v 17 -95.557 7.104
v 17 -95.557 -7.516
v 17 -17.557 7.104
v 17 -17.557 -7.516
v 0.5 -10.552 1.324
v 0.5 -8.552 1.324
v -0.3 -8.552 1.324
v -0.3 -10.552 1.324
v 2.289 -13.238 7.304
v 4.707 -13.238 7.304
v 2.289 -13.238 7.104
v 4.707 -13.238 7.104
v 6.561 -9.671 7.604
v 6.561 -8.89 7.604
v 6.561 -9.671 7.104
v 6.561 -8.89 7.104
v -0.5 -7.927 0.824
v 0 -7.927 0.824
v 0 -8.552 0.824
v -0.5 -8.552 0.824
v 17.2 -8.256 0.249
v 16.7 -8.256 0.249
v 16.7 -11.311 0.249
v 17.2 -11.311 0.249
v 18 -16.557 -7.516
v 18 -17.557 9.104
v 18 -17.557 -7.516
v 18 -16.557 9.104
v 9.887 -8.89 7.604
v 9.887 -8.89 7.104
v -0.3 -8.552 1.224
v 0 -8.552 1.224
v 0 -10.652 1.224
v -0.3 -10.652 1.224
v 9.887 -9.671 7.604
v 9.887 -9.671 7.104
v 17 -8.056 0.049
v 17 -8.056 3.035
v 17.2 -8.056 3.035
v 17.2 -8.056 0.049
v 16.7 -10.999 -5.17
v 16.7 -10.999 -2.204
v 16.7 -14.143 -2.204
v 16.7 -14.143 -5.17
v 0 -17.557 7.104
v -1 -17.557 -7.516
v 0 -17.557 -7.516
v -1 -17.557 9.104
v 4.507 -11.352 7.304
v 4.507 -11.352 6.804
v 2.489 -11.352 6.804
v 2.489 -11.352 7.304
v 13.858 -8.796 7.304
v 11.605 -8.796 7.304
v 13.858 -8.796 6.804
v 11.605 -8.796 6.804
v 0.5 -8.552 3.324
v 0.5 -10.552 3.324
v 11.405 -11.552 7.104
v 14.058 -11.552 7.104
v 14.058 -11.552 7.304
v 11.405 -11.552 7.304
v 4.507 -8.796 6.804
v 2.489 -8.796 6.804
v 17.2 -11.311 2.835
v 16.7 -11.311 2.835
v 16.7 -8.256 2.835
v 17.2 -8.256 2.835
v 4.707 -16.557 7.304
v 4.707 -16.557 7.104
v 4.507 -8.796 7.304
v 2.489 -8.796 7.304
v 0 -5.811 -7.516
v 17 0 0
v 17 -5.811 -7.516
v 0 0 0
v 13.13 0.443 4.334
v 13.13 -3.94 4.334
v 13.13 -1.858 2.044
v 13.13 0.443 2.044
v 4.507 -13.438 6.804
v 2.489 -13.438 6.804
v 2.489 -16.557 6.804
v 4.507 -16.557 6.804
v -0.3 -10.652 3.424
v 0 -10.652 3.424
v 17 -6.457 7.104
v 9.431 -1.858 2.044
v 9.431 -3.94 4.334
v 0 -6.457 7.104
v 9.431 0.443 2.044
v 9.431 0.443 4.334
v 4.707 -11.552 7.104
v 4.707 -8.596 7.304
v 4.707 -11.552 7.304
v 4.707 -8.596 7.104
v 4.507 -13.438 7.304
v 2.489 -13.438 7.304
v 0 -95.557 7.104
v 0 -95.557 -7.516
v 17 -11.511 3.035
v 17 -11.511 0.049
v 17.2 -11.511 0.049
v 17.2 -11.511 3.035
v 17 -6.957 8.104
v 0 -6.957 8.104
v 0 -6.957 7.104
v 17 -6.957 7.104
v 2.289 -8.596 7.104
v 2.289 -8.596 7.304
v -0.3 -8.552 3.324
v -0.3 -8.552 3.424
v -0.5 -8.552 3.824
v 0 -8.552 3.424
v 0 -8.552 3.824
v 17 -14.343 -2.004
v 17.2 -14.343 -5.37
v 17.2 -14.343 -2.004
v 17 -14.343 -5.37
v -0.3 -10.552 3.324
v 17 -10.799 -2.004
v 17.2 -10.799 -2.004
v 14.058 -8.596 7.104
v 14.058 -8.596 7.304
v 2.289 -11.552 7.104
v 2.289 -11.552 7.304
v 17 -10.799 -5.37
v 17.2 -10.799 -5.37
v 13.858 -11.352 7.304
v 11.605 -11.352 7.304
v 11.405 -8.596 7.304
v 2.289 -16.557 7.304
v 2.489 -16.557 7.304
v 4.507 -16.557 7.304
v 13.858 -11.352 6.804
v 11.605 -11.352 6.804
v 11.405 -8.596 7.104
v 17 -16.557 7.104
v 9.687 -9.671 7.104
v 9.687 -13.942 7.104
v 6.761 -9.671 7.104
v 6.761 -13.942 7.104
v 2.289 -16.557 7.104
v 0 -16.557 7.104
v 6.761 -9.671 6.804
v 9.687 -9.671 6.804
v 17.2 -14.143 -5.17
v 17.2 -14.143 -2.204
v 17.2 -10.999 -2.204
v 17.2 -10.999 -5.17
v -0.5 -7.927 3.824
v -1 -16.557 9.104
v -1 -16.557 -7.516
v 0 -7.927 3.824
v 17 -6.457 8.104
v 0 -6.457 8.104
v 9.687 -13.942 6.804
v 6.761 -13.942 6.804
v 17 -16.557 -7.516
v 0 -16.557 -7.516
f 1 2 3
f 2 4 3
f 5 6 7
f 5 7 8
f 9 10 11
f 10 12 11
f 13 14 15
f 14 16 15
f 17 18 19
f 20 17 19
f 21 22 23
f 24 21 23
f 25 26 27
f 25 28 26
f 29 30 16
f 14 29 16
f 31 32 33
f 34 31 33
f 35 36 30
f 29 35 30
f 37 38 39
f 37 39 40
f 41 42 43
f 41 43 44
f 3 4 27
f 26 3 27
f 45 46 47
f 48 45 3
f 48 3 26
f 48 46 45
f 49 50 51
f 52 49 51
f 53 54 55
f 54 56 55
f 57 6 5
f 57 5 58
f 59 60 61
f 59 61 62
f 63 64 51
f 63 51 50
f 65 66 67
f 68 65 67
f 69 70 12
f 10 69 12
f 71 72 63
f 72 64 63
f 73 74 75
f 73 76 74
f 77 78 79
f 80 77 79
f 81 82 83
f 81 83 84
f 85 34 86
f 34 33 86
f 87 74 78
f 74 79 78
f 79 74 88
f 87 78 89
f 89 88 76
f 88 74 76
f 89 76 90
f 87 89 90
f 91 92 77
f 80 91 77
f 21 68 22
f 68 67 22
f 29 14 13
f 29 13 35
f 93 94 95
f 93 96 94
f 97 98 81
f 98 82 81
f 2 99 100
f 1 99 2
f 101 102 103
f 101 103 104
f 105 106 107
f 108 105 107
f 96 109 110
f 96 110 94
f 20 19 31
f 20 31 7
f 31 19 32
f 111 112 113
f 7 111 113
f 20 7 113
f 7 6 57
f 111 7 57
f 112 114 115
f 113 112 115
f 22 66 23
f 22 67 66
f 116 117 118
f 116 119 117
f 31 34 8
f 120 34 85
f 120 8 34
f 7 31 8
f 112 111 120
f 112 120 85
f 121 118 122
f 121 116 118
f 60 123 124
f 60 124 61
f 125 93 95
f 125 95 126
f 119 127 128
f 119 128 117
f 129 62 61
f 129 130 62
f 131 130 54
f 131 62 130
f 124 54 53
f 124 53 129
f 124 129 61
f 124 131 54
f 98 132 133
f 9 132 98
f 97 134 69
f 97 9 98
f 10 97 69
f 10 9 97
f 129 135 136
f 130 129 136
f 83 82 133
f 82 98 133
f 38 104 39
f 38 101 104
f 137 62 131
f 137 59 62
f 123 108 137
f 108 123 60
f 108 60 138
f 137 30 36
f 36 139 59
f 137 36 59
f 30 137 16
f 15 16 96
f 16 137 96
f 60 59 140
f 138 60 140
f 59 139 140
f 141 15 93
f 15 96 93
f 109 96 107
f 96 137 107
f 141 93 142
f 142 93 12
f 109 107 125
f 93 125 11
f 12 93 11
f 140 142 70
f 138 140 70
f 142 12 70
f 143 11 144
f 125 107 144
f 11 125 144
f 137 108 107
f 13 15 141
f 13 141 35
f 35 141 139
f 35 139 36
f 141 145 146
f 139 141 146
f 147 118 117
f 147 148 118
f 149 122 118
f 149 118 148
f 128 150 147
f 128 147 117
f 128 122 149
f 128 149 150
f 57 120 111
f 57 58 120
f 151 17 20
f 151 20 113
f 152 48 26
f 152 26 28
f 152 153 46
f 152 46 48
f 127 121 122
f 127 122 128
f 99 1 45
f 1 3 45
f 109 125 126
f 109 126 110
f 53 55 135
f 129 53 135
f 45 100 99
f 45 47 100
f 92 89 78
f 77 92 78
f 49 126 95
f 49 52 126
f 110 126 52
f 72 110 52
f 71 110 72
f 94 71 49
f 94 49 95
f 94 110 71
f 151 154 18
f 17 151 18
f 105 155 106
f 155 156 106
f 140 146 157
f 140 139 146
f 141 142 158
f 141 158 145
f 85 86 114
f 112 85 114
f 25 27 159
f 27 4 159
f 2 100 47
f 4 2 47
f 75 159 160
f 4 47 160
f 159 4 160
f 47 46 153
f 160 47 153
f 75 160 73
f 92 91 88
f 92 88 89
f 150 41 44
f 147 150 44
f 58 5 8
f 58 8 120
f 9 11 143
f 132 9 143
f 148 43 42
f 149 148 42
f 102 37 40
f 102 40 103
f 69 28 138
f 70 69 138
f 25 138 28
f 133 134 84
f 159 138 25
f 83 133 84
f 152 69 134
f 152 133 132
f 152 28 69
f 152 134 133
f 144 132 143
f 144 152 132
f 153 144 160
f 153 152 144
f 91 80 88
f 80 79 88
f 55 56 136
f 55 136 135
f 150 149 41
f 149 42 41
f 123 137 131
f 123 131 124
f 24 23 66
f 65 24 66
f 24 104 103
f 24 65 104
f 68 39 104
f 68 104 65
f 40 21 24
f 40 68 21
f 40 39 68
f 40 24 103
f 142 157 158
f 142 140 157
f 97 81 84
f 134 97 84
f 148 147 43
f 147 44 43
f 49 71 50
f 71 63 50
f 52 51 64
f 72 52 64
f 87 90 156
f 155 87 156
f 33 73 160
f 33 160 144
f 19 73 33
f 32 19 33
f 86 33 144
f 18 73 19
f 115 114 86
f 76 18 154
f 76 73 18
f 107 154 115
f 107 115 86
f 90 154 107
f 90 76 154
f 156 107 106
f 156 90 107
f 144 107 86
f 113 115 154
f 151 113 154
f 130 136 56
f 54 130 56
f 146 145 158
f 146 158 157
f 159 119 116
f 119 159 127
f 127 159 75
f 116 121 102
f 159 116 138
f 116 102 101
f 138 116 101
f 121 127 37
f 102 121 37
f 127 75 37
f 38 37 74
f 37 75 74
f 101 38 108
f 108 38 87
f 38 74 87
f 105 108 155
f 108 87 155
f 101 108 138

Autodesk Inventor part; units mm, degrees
ref_plane "YZ Plane" through (0, 0, 0) normal (1, 0, 0) x (0, 1, 0)
ref_plane "XZ Plane" through (0, 0, 0) normal (0, 1, 0) x (-1, 0, 0)
sketch "草圖1" plane through (0, 0, 0) normal (1, 0, 0) x (0, 1, 0)
  line L0 (0, 0) -> (-6.4572, 7.1039)
  line L1 (-6.4572, 7.1039) -> (-6.4572, 8.1039)
  line L2 (-6.4572, 8.1039) -> (-6.9572, 8.1039)
  line L3 (-6.9572, 8.1039) -> (-6.9572, 7.1039)
  line L4 (-6.9572, 7.1039) -> (-16.5572, 7.1039)
  line L5 (-16.5572, 7.1039) -> (-16.5572, 9.1039)
  line L6 (-16.5572, 9.1039) -> (-17.5572, 9.1039)
  line L7 (-17.5572, 9.1039) -> (-17.5572, 0)
  line L8 (0, 0) -> (-5.811, -7.5155)
  line L9 (-5.811, -7.5155) -> (-17.5572, -7.5155)
  line L10 (-17.5572, -7.5155) -> (-17.5572, 0)
  dimension "d0" = 9.6
  dimension "d1" = 1
  dimension "d2" = 0.5
  dimension "d3" = 9.6
  dimension "d4" = 2
  dimension "d5" = 1
  dimension "d6" = 9.5
extrude "擠出1" add sketch "草圖1" along normal blind 17
sketch "草圖2" plane through (0, 0, 0) normal (-1, 0, 0) x (0, 0, 1)
  line L0 (1.3244, -10.5521) -> (3.3244, -10.5521)
  line L1 (3.3244, -10.5521) -> (3.3244, -8.5521)
  line L2 (3.3244, -8.5521) -> (1.3244, -8.5521)
  line L3 (1.3244, -8.5521) -> (1.3244, -10.5521)
  line L4 (1.3244, -10.5521) -> (3.3244, -8.5521) construction
  line L5 (3.3244, -10.5521) -> (1.3244, -8.5521) construction
  line L6 (0.8244, -8.5521) -> (3.8244, -8.5521)
  line L7 (3.8244, -8.5521) -> (3.8244, -7.9272)
  line L8 (3.8244, -7.9272) -> (0.8244, -7.9272)
  line L9 (0.8244, -7.9272) -> (0.8244, -8.5521)
  line L10 (1.2244, -10.6521) -> (3.4244, -10.6521)
  line L11 (3.4244, -10.6521) -> (3.4244, -8.4521)
  line L12 (3.4244, -8.4521) -> (1.2244, -8.4521)
  line L13 (1.2244, -8.4521) -> (1.2244, -10.6521)
  line L14 (1.2244, -10.6521) -> (3.4244, -8.4521) construction
  line L15 (3.4244, -10.6521) -> (1.2244, -8.4521) construction
  point P0 (0, 0)
  point P1 (2.3244, -9.5521)
  point P2 (0.8244, -8.2396)
  point P3 (1.2244, -8.5521)
  point P4 (3.4244, -8.5521)
  dimension "d9" = 0.5
  dimension "d10" = 0.5
  dimension "d15" = 0.1
  dimension "d16" = 0.1
  dimension "d17" = 0.1
  dimension "d18" = 0.1
  dimension "d19" = 2
extrude "擠出2" add sketch "草圖2" along normal blind 0.5 contours L6 L13 L12 L11 L2 | L6 L9 L8 L7 L11 L12 L13
extrude "擠出3" cut sketch "草圖2" against normal blind 0.5 contours L3 L2 L1 L0
extrude "擠出4" add sketch "草圖2" along normal blind 0.3 contours L0 L1 L6 L11 L10 L13 L3
sketch "草圖3" plane through (0, -16.5572, 7.1039) normal (0, 0, 1) x (1, 0, 0)
  line L0 (2.4891, 7.7612) -> (4.5073, 7.7612)
  line L1 (4.5073, 7.7612) -> (4.5073, 5.2048)
  line L2 (4.5073, 5.2048) -> (2.4891, 5.2048)
  line L3 (2.4891, 5.2048) -> (2.4891, 7.7612)
  line L4 (0, 0) -> (17, 0) projected
  line L5 (2.4891, 0) -> (4.5073, 0)
  line L6 (4.5073, 0) -> (4.5073, 3.1193)
  line L7 (4.5073, 3.1193) -> (2.4891, 3.1193)
  line L8 (2.4891, 3.1193) -> (2.4891, 0)
  line L9 (6.761, 6.8866) -> (9.6873, 6.8866)
  line L10 (9.6873, 6.8866) -> (9.6873, 2.6148)
  line L11 (9.6873, 2.6148) -> (6.761, 2.6148)
  line L12 (6.761, 2.6148) -> (6.761, 6.8866)
  line L13 (11.6046, 7.7612) -> (13.8583, 7.7612)
  line L14 (13.8583, 7.7612) -> (13.8583, 5.2048)
  line L15 (13.8583, 5.2048) -> (11.6046, 5.2048)
  line L16 (11.6046, 5.2048) -> (11.6046, 7.7612)
  point P0 (0, 16.5572)
extrude "擠出5" cut sketch "草圖3" against normal blind 0.3
sketch "草圖4" plane through (0, -16.5572, 7.1039) normal (0, 0, 1) x (1, 0, 0)
  line L0 (0, 0) -> (17, 0) projected
  line L1 (2.2891, 0) -> (4.7073, 0)
  line L2 (4.7073, 0) -> (4.7073, 3.3193)
  line L3 (4.7073, 3.3193) -> (2.2891, 3.3193)
  line L4 (2.2891, 3.3193) -> (2.2891, 0)
  line L5 (6.561, 6.8866) -> (9.8873, 6.8866)
  line L6 (9.8873, 6.8866) -> (9.8873, 7.667)
  line L7 (9.8873, 7.667) -> (6.561, 7.667)
  line L8 (6.561, 7.667) -> (6.561, 6.8866)
  line L9 (6.761, 2.6148) -> (6.761, 6.8866) projected
  line L10 (9.6873, 6.8866) -> (9.6873, 2.6148) projected
  line L11 (4.5073, 3.1193) -> (4.5073, 0) projected
  line L12 (2.4891, 0) -> (2.4891, 3.1193) projected
  line L13 (2.4891, 3.1193) -> (4.5073, 3.1193) projected
  line L14 (2.2891, 7.9612) -> (4.7073, 7.9612)
  line L15 (4.7073, 7.9612) -> (4.7073, 5.0048)
  line L16 (4.7073, 5.0048) -> (2.2891, 5.0048)
  line L17 (2.2891, 5.0048) -> (2.2891, 7.9612)
  line L18 (11.4046, 7.9612) -> (14.0583, 7.9612)
  line L19 (14.0583, 7.9612) -> (14.0583, 5.0048)
  line L20 (14.0583, 5.0048) -> (11.4046, 5.0048)
  line L21 (11.4046, 5.0048) -> (11.4046, 7.9612)
  line L22 (11.6046, 7.7612) -> (13.8583, 7.7612) projected
  line L23 (13.8583, 7.7612) -> (13.8583, 5.2048) projected
  line L24 (11.6046, 5.2048) -> (11.6046, 7.7612) projected
  line L25 (13.8583, 5.2048) -> (11.6046, 5.2048) projected
  line L26 (4.5073, 7.7612) -> (4.5073, 5.2048) projected
  line L27 (4.5073, 5.2048) -> (2.4891, 5.2048) projected
  line L28 (2.4891, 5.2048) -> (2.4891, 7.7612) projected
  line L29 (2.4891, 7.7612) -> (4.5073, 7.7612)
  line L30 (4.5073, 7.7612) -> (4.5073, 5.2048)
  line L31 (4.5073, 5.2048) -> (2.4891, 5.2048)
  line L32 (2.4891, 5.2048) -> (2.4891, 7.7612)
  line L33 (2.4891, 3.1193) -> (4.5073, 3.1193)
  line L34 (4.5073, 3.1193) -> (4.5073, 0)
  line L35 (4.5073, 0) -> (2.4891, 0)
  line L36 (2.4891, 0) -> (2.4891, 3.1193)
  line L37 (11.6046, 7.7612) -> (13.8583, 7.7612)
  line L38 (13.8583, 7.7612) -> (13.8583, 5.2048)
  line L39 (13.8583, 5.2048) -> (11.6046, 5.2048)
  line L40 (11.6046, 5.2048) -> (11.6046, 7.7612)
  point P0 (0, 16.5572)
  dimension "d24" = 0.2
  dimension "d25" = 0.2
  dimension "d26" = 0.2
  dimension "d27" = 0.2
  dimension "d28" = 0.2
  dimension "d29" = 0.2
  dimension "d30" = 0.2
  dimension "d31" = 0.2
  dimension "d32" = 0.2
  dimension "d33" = 0.2
  dimension "d34" = 0.2
  dimension "d35" = 0.2
extrude "擠出6" add sketch "草圖4" along normal blind 0.2 contours L4 L3 L2 L0 L11 L13 L12 | L14 L15 L16 L17 | L18 L19 L20 L21
extrude "擠出7" add sketch "草圖4" along normal blind 0.5 contours L8 L7 L6 L5
sketch "草圖5" plane through (17, 0, 0) normal (1, 0, 0) x (0, 0, -1)
  line L0 (-2.8354, -8.2564) -> (-0.2487, -8.2564)
  line L1 (-0.2487, -8.2564) -> (-0.2487, -11.3114)
  line L2 (-0.2487, -11.3114) -> (-2.8354, -11.3114)
  line L3 (-2.8354, -11.3114) -> (-2.8354, -8.2564)
  line L4 (2.2042, -10.9992) -> (5.1699, -10.9992)
  line L5 (5.1699, -10.9992) -> (5.1699, -14.1433)
  line L6 (5.1699, -14.1433) -> (2.2042, -14.1433)
  line L7 (2.2042, -14.1433) -> (2.2042, -10.9992)
  line L8 (-3.0354, -8.0564) -> (-0.0487, -8.0564)
  line L9 (-0.0487, -8.0564) -> (-0.0487, -11.5114)
  line L10 (-0.0487, -11.5114) -> (-3.0354, -11.5114)
  line L11 (-3.0354, -11.5114) -> (-3.0354, -8.0564)
  line L12 (2.0042, -10.7992) -> (5.3699, -10.7992)
  line L13 (5.3699, -10.7992) -> (5.3699, -14.3433)
  line L14 (5.3699, -14.3433) -> (2.0042, -14.3433)
  line L15 (2.0042, -14.3433) -> (2.0042, -10.7992)
  point P0 (0, 0)
  dimension "d40" = 0.2
  dimension "d41" = 0.2
  dimension "d42" = 0.2
  dimension "d43" = 0.2
  dimension "d44" = 0.2
  dimension "d45" = 0.2
  dimension "d46" = 0.2
  dimension "d47" = 0.2
extrude "擠出8" cut sketch "草圖5" against normal blind 0.3 contours L0 L1 L2 L3 | L4 L5 L6 L7
extrude "擠出9" add sketch "草圖5" along normal blind 0.2
sketch "草圖6" plane through (0, -17.5572, -7.5155) normal (0, -1, 0) x (1, 0, 0)
  line L0 (0, 0) -> (0, 7.5155) projected
  line L1 (17, 7.5155) -> (17, 14.6194) projected
  line L2 (0, 0) -> (17, 0)
  line L3 (17, 0) -> (17, 14.6194)
  line L4 (17, 14.6194) -> (0, 14.6194)
  line L5 (0, 14.6194) -> (0, 0)
extrude "擠出10" add sketch "草圖6" along normal blind 78
sketch "草圖7" plane through (0, 0, 0) normal (-1, 0, 0) x (0, 0, 1)
  line L0 (9.1039, -16.5572) -> (9.1039, -17.5572) projected
  line L1 (-7.5155, -5.811) -> (-7.5155, -95.5572) projected
  line L2 (9.1039, -17.5572) -> (-7.5155, -17.5572)
  line L3 (-7.5155, -17.5572) -> (-7.5155, -16.5572)
  line L4 (-7.5155, -16.5572) -> (9.1039, -16.5572)
  line L5 (9.1039, -16.5572) -> (9.1039, -17.5572)
  point P0 (0, 0)
  point P1 (-7.5155, -17.5572)
  dimension "d54" = 1
extrude "擠出11" add sketch "草圖7" along normal blind 1
ref_plane "工作平面1" through (8.5, 0, 0) normal (-1, 0, 0) x (0, 0, 1)
mirror "鏡射1" about plane through (8.5, 0, 0) normal (-1, 0, 0) of "擠出11"
sketch "草圖8" plane through (0, -17.5572, 7.1039) normal (0, -1, 0) x (1, 0, 0)
  line L0 (9.431, -2.7696) -> (13.1296, -2.7696)
  line L1 (13.1296, -2.7696) -> (13.1296, -5.0596)
  line L2 (13.1296, -5.0596) -> (9.431, -5.0596)
  line L3 (9.431, -5.0596) -> (9.431, -2.7696)
  point P0 (0, -7.1039)
extrude "擠出12" add sketch "草圖8" against normal blind 18
properties part number "屋1 物3"
